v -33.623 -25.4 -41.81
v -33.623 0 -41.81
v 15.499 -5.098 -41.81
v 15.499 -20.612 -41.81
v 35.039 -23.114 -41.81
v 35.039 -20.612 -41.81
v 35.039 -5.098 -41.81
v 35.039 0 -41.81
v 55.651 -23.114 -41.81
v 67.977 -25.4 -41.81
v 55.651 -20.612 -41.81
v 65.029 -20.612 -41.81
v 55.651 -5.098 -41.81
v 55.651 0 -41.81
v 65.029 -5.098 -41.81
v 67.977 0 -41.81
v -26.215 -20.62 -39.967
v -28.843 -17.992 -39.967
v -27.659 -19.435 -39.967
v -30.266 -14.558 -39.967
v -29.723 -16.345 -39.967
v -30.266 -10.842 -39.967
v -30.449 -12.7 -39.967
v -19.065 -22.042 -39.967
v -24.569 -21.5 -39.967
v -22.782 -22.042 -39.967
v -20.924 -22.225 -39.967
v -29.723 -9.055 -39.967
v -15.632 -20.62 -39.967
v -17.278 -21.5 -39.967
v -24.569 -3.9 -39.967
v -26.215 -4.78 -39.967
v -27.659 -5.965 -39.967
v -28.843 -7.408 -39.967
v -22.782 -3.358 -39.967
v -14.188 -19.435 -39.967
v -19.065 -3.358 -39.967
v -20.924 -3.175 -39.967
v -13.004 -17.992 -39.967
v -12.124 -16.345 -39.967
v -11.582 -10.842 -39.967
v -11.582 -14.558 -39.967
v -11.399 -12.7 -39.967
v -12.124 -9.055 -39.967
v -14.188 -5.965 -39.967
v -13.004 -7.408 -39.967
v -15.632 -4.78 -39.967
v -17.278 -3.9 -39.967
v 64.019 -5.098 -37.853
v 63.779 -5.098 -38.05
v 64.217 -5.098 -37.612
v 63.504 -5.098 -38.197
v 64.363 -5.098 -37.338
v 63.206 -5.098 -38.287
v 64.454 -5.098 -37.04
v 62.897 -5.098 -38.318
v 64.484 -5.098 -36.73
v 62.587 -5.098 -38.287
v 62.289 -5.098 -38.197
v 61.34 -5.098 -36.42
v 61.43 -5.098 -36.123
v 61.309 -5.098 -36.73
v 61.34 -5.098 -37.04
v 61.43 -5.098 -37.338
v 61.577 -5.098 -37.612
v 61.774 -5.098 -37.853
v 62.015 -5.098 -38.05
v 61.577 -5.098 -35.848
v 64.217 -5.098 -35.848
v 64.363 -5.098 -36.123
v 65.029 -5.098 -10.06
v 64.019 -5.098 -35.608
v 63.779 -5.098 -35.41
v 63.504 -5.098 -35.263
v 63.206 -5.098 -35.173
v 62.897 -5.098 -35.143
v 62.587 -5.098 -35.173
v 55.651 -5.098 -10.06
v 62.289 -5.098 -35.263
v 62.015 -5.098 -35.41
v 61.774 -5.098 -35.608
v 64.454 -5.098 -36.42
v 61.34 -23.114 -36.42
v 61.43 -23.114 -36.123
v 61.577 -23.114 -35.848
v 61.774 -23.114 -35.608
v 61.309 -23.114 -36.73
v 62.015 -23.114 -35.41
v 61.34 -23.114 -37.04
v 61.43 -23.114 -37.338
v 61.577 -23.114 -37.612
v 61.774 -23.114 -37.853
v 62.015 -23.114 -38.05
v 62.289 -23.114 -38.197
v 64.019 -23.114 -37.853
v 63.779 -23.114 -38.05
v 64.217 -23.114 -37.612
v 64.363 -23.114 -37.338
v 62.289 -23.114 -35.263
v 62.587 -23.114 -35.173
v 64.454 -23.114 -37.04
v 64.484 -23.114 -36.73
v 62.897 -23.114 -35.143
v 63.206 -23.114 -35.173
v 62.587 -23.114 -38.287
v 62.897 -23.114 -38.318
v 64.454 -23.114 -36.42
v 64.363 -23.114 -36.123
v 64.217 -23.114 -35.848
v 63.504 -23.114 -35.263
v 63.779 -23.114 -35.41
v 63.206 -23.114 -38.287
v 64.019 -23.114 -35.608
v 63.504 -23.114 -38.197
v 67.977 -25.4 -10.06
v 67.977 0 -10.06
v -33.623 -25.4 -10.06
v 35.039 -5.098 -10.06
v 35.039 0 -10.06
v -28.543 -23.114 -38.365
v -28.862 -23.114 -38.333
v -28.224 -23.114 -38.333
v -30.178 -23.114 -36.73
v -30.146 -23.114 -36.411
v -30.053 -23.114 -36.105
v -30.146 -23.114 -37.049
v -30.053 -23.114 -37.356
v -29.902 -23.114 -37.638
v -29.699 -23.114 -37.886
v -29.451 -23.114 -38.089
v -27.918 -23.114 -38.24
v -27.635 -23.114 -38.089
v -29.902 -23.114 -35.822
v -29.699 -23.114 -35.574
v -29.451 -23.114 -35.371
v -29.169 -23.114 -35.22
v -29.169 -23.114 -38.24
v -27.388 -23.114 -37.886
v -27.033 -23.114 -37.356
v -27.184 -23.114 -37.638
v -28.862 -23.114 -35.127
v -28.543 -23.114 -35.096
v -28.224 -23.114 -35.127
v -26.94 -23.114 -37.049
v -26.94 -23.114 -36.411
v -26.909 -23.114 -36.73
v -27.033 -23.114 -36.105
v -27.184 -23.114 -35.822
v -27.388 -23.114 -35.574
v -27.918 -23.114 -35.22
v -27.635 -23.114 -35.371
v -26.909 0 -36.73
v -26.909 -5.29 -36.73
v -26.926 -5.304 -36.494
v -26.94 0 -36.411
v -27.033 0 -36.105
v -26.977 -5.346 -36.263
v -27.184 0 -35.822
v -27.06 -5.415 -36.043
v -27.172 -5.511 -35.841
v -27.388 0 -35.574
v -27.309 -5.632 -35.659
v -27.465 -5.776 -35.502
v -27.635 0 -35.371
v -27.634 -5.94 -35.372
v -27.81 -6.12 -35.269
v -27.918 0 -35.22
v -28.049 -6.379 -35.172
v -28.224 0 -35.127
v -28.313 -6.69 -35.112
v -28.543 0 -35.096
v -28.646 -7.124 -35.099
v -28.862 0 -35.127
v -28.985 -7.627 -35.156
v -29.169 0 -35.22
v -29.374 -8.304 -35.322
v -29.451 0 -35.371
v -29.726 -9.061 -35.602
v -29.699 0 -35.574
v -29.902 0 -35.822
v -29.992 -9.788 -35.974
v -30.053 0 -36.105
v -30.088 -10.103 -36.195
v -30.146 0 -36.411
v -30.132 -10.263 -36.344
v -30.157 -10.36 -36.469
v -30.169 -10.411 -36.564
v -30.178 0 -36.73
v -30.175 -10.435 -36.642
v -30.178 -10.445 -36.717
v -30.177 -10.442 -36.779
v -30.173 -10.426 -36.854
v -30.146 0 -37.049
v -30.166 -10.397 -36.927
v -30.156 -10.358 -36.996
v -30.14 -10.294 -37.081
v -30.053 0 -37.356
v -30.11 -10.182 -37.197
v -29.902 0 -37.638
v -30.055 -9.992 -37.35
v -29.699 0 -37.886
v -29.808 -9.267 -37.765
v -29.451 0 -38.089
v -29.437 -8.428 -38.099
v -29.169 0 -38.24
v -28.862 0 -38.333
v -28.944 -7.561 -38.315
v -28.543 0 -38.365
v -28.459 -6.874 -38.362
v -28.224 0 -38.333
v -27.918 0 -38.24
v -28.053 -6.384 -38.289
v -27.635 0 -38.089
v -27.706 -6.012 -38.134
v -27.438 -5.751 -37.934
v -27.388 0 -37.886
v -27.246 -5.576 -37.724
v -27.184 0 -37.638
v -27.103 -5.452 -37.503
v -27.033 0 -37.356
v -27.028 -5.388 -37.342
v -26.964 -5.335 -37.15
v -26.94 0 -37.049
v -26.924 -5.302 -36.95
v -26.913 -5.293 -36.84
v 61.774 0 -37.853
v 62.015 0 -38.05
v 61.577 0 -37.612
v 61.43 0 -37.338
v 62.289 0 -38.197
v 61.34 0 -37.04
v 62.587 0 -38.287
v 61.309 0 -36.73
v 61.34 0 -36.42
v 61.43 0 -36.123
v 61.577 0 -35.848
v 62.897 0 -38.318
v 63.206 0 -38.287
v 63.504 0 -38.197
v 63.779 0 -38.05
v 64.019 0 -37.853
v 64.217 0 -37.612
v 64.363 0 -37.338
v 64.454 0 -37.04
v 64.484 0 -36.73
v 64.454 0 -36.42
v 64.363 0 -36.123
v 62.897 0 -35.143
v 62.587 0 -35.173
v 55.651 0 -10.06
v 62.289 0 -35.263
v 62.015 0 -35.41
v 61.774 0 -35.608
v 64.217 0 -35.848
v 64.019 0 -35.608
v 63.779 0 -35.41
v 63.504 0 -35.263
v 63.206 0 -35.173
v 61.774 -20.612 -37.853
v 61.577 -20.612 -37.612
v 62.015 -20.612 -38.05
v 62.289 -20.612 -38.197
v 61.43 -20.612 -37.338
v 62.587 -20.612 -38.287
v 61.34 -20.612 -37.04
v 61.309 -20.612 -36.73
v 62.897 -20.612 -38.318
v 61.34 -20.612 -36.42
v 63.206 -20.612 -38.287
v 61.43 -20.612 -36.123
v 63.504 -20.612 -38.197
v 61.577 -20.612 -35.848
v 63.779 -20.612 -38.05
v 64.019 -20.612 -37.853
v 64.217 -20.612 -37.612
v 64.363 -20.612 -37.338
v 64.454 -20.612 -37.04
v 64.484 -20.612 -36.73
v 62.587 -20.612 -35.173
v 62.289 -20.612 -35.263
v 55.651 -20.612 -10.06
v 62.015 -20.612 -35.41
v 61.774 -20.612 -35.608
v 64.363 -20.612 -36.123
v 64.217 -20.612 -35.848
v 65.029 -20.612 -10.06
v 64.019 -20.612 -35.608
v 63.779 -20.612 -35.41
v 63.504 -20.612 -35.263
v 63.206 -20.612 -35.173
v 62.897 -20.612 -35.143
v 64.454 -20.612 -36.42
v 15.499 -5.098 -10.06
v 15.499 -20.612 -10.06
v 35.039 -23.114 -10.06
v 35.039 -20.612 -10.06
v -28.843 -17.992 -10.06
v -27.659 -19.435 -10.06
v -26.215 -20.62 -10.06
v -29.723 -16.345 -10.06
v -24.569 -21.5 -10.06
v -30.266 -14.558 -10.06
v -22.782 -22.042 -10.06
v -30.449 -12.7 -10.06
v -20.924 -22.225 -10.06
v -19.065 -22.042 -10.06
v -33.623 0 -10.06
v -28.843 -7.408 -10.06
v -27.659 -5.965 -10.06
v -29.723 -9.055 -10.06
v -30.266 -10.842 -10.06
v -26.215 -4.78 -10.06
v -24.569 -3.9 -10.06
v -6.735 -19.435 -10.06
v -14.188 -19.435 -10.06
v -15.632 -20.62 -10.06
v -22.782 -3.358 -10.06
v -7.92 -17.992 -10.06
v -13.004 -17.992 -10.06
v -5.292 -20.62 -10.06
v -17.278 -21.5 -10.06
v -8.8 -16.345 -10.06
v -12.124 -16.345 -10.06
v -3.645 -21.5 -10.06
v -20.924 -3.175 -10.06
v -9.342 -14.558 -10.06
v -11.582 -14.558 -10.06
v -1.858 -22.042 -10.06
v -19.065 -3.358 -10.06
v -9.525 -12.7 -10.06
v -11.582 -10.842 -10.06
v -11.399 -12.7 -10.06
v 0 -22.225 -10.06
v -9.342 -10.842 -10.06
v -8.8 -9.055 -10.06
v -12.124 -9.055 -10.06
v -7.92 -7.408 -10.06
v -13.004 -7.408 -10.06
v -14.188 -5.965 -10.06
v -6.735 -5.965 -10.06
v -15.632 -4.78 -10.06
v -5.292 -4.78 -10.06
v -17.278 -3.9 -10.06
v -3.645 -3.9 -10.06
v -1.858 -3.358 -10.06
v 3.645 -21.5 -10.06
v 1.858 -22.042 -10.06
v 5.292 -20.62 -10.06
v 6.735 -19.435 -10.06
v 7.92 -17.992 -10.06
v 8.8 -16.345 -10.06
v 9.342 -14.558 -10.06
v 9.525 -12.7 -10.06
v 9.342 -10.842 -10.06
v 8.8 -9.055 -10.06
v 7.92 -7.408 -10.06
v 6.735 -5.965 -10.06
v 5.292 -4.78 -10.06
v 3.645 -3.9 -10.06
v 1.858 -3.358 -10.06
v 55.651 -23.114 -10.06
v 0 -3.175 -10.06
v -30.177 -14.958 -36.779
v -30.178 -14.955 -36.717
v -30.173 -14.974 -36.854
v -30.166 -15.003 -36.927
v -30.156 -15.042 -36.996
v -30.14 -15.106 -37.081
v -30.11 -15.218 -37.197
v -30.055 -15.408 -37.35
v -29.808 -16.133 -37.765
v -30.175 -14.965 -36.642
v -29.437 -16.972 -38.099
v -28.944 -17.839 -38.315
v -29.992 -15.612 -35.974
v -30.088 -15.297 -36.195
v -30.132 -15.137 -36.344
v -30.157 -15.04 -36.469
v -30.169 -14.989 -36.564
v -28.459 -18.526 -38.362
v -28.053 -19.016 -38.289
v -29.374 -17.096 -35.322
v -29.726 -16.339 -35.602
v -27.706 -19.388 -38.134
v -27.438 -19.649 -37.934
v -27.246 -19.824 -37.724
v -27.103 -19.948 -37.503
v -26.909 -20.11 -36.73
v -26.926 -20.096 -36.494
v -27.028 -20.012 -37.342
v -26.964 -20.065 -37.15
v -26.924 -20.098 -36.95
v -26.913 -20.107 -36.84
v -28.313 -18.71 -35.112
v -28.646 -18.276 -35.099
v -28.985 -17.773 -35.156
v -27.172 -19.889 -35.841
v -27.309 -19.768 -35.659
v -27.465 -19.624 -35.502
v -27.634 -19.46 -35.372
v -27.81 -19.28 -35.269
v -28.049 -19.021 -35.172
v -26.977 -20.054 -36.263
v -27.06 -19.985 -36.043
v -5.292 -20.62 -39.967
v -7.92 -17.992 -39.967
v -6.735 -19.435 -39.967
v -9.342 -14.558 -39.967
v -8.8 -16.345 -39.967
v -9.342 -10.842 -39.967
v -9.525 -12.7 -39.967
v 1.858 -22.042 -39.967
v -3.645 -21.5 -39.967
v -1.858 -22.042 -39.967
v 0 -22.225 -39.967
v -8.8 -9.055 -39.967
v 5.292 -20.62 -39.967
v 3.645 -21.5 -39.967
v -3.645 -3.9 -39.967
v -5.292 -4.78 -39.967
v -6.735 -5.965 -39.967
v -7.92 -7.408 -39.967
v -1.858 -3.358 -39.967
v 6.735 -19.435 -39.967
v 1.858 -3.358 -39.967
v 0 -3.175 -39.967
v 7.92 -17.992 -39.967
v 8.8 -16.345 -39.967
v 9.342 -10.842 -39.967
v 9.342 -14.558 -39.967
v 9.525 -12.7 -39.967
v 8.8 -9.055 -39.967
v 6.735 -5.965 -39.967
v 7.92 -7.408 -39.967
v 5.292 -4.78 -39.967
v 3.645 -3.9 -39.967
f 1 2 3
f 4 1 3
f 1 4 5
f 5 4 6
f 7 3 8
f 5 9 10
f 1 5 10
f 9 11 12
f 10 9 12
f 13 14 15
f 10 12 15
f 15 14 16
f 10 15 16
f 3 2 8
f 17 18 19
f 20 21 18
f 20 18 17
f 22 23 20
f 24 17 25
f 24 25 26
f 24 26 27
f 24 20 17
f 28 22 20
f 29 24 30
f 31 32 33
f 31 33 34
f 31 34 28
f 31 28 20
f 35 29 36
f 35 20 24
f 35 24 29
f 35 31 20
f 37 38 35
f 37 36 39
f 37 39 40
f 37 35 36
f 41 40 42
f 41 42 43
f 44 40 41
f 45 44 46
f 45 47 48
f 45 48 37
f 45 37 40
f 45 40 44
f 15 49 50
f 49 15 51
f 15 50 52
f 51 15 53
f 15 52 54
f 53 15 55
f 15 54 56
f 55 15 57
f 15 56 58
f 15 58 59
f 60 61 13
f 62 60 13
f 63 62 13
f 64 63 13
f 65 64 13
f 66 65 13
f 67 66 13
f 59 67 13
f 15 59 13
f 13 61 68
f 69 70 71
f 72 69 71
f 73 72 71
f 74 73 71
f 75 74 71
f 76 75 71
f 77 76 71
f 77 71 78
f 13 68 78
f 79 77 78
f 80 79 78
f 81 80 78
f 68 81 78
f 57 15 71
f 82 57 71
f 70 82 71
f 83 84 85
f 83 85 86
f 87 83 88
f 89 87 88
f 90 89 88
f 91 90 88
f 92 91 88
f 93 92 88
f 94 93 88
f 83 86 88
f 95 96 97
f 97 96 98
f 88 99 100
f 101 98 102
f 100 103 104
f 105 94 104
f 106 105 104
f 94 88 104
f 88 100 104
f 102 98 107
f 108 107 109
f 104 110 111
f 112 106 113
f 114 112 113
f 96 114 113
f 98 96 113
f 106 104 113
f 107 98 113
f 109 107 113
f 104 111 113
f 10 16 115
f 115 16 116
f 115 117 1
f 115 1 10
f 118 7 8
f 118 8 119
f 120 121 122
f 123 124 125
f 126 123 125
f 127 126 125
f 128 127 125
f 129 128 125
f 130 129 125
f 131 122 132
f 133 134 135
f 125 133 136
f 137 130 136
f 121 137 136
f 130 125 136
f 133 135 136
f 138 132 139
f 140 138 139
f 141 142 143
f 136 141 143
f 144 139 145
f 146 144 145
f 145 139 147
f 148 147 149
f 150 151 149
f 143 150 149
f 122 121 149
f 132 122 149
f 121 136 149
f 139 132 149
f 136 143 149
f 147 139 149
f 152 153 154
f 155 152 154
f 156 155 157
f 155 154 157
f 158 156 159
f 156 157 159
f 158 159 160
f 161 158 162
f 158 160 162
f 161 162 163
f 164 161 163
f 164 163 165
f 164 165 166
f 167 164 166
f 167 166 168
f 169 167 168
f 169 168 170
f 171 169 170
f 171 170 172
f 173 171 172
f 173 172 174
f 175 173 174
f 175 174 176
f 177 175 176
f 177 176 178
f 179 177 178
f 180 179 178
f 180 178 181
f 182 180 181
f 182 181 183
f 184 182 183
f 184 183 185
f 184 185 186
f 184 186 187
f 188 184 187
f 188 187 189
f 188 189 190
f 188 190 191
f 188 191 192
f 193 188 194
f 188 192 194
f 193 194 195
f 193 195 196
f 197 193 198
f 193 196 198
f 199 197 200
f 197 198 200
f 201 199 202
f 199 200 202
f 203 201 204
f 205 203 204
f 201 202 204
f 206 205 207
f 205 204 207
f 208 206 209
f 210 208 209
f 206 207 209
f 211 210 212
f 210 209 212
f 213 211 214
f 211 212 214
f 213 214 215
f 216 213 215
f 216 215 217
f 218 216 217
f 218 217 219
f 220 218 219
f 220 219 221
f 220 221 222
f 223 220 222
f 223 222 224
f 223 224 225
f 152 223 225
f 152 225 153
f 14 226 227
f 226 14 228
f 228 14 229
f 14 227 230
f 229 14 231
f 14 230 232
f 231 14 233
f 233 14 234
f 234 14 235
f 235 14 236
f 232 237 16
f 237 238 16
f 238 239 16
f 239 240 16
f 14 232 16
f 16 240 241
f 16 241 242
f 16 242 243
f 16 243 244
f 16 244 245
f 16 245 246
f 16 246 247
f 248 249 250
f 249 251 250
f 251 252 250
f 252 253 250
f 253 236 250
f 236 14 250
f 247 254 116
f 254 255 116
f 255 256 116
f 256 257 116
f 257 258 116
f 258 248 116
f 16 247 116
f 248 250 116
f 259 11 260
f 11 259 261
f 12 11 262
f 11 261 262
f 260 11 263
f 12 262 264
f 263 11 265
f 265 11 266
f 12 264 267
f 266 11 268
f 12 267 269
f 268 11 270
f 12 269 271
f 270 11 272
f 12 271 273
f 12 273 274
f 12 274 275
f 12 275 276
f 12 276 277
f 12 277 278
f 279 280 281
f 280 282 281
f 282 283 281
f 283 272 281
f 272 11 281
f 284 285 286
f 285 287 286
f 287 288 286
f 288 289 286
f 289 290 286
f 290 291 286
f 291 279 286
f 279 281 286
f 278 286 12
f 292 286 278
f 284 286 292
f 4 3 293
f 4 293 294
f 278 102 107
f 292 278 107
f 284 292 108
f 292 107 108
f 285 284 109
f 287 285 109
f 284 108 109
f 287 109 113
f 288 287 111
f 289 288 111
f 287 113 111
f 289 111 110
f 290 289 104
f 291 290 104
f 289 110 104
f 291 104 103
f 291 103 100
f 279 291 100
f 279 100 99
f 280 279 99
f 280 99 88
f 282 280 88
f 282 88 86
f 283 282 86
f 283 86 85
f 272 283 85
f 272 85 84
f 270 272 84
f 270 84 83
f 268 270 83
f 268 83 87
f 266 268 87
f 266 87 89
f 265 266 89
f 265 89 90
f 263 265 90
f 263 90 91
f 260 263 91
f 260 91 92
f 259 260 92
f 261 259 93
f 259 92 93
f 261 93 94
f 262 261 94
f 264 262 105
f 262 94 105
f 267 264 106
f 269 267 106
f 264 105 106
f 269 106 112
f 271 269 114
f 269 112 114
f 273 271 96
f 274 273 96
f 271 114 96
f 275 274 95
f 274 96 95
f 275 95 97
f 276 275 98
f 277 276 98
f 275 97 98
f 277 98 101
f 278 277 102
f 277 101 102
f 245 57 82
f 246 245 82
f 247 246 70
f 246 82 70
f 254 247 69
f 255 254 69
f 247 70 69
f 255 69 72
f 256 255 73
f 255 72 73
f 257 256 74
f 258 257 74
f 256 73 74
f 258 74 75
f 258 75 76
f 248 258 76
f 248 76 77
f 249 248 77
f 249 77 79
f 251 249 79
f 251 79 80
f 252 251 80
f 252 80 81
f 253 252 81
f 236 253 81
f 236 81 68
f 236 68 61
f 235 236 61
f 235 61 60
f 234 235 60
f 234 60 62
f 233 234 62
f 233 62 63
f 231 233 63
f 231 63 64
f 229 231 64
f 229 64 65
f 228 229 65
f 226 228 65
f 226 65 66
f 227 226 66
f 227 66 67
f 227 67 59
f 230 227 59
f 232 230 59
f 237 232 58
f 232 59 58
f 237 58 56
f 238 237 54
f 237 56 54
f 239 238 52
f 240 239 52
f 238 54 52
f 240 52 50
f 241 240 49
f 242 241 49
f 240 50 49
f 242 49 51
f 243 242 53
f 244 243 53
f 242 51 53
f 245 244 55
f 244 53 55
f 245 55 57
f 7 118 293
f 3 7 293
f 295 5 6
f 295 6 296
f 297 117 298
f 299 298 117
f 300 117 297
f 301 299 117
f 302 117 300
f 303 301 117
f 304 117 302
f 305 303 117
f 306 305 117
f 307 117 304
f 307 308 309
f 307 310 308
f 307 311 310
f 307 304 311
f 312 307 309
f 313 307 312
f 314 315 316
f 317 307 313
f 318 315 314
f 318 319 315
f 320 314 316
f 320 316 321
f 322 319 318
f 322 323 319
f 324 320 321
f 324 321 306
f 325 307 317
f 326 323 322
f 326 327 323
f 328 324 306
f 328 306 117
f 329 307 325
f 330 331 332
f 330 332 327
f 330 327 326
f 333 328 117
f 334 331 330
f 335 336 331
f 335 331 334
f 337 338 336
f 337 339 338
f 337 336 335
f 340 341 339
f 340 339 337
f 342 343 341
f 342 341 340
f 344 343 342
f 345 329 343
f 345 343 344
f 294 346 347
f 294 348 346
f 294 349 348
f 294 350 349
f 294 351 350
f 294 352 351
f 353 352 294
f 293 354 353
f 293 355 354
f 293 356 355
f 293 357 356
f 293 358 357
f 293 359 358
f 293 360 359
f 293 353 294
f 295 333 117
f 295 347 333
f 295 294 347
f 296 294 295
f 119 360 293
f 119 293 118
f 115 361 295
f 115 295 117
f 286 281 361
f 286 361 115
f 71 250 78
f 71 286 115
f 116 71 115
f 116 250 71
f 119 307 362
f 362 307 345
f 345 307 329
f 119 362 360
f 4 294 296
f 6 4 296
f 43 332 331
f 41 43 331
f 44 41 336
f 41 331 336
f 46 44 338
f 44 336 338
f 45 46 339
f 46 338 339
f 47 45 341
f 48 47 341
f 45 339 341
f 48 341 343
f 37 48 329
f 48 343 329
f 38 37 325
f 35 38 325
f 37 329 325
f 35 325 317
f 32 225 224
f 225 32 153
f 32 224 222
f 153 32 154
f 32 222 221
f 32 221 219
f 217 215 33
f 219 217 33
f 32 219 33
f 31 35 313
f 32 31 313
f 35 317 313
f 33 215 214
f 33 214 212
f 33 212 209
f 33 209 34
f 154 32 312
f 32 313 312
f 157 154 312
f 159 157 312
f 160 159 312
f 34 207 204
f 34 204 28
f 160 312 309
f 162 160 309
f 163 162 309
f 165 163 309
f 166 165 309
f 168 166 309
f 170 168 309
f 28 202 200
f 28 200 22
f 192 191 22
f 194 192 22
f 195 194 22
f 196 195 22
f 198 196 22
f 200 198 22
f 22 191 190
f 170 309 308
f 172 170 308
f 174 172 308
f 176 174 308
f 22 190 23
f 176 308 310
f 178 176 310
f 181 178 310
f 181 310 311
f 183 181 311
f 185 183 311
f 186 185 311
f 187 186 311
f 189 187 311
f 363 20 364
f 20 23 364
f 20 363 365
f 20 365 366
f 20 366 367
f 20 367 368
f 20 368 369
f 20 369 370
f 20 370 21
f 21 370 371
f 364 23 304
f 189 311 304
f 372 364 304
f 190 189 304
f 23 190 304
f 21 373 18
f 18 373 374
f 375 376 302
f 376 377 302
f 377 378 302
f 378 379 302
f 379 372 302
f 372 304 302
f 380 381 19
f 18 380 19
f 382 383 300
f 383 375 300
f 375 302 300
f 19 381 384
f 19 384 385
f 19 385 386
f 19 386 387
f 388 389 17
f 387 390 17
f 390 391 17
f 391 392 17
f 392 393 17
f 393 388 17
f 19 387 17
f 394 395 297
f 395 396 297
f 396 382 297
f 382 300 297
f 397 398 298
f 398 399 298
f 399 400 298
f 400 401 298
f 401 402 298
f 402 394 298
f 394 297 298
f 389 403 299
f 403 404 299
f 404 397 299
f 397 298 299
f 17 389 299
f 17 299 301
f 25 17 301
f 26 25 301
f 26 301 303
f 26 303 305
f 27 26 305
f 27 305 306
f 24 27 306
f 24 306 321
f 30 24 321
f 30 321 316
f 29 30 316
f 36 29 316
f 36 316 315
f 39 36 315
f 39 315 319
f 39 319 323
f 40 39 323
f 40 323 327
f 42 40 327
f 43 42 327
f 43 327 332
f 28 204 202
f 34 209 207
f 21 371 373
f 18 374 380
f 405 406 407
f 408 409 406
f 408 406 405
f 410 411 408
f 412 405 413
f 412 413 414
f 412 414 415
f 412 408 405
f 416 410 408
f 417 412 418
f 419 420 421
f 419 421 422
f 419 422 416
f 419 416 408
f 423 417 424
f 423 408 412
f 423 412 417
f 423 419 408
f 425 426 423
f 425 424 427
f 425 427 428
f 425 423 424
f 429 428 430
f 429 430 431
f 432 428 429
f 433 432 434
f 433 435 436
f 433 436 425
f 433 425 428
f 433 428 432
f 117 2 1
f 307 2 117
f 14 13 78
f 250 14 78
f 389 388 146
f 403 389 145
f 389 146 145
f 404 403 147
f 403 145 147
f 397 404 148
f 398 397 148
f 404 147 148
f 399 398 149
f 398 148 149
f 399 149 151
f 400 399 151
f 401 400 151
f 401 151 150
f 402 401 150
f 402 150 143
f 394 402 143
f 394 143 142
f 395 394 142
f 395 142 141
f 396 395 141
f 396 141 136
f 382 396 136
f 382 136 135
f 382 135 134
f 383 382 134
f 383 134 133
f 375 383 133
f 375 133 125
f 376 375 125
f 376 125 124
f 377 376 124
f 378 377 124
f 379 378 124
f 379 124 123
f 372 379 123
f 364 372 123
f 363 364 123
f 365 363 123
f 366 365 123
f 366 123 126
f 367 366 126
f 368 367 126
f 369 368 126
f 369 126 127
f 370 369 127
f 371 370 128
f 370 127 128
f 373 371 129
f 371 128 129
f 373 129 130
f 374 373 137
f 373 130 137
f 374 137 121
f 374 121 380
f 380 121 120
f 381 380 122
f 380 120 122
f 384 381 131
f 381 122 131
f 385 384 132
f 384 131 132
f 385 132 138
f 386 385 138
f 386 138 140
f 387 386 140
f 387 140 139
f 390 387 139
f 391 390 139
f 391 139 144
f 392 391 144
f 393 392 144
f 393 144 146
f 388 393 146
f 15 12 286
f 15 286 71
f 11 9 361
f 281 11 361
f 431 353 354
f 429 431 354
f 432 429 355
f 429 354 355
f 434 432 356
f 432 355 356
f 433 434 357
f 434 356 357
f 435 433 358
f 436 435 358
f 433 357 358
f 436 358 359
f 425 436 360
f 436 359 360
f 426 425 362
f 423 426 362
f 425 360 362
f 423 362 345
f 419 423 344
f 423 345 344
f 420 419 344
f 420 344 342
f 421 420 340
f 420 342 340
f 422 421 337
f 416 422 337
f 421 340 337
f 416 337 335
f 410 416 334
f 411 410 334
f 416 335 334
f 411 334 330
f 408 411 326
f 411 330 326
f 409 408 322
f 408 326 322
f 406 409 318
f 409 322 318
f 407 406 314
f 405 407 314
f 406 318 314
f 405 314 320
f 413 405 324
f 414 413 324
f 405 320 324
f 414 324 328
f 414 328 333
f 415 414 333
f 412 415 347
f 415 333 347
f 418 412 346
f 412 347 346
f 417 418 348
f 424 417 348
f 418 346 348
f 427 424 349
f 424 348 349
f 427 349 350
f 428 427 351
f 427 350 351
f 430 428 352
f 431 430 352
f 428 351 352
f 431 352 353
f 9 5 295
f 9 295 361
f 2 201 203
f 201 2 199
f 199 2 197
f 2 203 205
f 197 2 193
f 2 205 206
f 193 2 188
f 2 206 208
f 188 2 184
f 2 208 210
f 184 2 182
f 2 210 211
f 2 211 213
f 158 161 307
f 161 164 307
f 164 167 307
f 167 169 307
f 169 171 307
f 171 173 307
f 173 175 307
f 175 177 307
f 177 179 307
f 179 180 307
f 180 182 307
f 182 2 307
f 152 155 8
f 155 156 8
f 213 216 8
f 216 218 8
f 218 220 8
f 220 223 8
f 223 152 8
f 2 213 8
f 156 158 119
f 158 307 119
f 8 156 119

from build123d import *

# Parameters (mm, degrees)
F0_W     = 101.6
F0_H     = 31.75
F1_DEPTH = 25.4
F2_R     = 9.525
F3_DEPTH = 29.90715
F4_R     = 1.6344312683
F4_R_2   = 1.5875
F4_W     = 20.6119902432
F4_H     = 38.1576609752
F5_DEPTH = 25.4
F4_H_2   = 31.75
F4_H_3   = 6.4076609752
F6_DEPTH = 2.286
F7_DEPTH = 76.2
F8_DEPTH = 6.4076609752


with BuildPart() as f1:
    # F0 (on Front) → F1 (new body)
    with BuildSketch(Plane.XZ):
        with Locations((17.1766635031, -25.9351255724)):
            Rectangle(F0_W, F0_H)
    extrude(amount=F1_DEPTH)

    # F2 (on face) → F3 (cut)
    with BuildSketch(Plane.XY.offset(-10.0601255724)):
        with Locations((-20.9235325456, -12.7)):
            Circle(F2_R)
        with Locations((0, -12.7)):
            Circle(F2_R)
        Polygon((15.4989976436, -5.0975899212), (15.4989976436, -20.6119939685), (65.0289976436, -20.6119939685), (65.0289976436, -5.0975899212), (40.2639976436, -5.0975899212), align=None)
    extrude(amount=-F3_DEPTH, mode=Mode.SUBTRACT)

    # F4 (on face) → F5 (cut)
    with BuildSketch(Plane.XZ.offset(25.4)):
        with Locations((-28.5433364969, -36.7301255724)):
            Circle(F4_R)
        with Locations((62.8966635031, -36.7301255724)):
            Circle(F4_R_2)
        with Locations((45.3453306109, -29.13895606)):
            Rectangle(F4_W, F4_H)
    extrude(amount=-F5_DEPTH, mode=Mode.SUBTRACT)

    # F4 (on face) → F6 (join)
    with BuildSketch(Plane.XZ.offset(25.4)):
        with Locations((-28.5433364969, -36.7301255724)):
            Circle(F4_R)
        with Locations((62.8966635031, -36.7301255724)):
            Circle(F4_R_2)
        with Locations((45.3453306109, -25.9351255724)):
            Rectangle(F4_W, F4_H_2)
        with Locations((45.3453306109, -45.01395606)):
            Rectangle(F4_W, F4_H_3)
    extrude(amount=-F6_DEPTH)

    # F2 (on face) → F7 (cut)
    with BuildSketch(Plane.XY.offset(-10.0601255724)):
        Polygon((15.4989976436, -5.0975899212), (15.4989976436, -20.6119939685), (65.0289976436, -20.6119939685), (65.0289976436, -5.0975899212), (40.2639976436, -5.0975899212), align=None)
    extrude(amount=-F7_DEPTH, mode=Mode.SUBTRACT)

    # F8 (cut, through all): a face of the model
    f8_faces = [f1.faces().sort_by_distance(p)[0] for p in [
        (45.3453306109, -24.257, -48.2177865475),
    ]]
    extrude(f8_faces, amount=-F8_DEPTH, mode=Mode.SUBTRACT)


solid = f1.part
